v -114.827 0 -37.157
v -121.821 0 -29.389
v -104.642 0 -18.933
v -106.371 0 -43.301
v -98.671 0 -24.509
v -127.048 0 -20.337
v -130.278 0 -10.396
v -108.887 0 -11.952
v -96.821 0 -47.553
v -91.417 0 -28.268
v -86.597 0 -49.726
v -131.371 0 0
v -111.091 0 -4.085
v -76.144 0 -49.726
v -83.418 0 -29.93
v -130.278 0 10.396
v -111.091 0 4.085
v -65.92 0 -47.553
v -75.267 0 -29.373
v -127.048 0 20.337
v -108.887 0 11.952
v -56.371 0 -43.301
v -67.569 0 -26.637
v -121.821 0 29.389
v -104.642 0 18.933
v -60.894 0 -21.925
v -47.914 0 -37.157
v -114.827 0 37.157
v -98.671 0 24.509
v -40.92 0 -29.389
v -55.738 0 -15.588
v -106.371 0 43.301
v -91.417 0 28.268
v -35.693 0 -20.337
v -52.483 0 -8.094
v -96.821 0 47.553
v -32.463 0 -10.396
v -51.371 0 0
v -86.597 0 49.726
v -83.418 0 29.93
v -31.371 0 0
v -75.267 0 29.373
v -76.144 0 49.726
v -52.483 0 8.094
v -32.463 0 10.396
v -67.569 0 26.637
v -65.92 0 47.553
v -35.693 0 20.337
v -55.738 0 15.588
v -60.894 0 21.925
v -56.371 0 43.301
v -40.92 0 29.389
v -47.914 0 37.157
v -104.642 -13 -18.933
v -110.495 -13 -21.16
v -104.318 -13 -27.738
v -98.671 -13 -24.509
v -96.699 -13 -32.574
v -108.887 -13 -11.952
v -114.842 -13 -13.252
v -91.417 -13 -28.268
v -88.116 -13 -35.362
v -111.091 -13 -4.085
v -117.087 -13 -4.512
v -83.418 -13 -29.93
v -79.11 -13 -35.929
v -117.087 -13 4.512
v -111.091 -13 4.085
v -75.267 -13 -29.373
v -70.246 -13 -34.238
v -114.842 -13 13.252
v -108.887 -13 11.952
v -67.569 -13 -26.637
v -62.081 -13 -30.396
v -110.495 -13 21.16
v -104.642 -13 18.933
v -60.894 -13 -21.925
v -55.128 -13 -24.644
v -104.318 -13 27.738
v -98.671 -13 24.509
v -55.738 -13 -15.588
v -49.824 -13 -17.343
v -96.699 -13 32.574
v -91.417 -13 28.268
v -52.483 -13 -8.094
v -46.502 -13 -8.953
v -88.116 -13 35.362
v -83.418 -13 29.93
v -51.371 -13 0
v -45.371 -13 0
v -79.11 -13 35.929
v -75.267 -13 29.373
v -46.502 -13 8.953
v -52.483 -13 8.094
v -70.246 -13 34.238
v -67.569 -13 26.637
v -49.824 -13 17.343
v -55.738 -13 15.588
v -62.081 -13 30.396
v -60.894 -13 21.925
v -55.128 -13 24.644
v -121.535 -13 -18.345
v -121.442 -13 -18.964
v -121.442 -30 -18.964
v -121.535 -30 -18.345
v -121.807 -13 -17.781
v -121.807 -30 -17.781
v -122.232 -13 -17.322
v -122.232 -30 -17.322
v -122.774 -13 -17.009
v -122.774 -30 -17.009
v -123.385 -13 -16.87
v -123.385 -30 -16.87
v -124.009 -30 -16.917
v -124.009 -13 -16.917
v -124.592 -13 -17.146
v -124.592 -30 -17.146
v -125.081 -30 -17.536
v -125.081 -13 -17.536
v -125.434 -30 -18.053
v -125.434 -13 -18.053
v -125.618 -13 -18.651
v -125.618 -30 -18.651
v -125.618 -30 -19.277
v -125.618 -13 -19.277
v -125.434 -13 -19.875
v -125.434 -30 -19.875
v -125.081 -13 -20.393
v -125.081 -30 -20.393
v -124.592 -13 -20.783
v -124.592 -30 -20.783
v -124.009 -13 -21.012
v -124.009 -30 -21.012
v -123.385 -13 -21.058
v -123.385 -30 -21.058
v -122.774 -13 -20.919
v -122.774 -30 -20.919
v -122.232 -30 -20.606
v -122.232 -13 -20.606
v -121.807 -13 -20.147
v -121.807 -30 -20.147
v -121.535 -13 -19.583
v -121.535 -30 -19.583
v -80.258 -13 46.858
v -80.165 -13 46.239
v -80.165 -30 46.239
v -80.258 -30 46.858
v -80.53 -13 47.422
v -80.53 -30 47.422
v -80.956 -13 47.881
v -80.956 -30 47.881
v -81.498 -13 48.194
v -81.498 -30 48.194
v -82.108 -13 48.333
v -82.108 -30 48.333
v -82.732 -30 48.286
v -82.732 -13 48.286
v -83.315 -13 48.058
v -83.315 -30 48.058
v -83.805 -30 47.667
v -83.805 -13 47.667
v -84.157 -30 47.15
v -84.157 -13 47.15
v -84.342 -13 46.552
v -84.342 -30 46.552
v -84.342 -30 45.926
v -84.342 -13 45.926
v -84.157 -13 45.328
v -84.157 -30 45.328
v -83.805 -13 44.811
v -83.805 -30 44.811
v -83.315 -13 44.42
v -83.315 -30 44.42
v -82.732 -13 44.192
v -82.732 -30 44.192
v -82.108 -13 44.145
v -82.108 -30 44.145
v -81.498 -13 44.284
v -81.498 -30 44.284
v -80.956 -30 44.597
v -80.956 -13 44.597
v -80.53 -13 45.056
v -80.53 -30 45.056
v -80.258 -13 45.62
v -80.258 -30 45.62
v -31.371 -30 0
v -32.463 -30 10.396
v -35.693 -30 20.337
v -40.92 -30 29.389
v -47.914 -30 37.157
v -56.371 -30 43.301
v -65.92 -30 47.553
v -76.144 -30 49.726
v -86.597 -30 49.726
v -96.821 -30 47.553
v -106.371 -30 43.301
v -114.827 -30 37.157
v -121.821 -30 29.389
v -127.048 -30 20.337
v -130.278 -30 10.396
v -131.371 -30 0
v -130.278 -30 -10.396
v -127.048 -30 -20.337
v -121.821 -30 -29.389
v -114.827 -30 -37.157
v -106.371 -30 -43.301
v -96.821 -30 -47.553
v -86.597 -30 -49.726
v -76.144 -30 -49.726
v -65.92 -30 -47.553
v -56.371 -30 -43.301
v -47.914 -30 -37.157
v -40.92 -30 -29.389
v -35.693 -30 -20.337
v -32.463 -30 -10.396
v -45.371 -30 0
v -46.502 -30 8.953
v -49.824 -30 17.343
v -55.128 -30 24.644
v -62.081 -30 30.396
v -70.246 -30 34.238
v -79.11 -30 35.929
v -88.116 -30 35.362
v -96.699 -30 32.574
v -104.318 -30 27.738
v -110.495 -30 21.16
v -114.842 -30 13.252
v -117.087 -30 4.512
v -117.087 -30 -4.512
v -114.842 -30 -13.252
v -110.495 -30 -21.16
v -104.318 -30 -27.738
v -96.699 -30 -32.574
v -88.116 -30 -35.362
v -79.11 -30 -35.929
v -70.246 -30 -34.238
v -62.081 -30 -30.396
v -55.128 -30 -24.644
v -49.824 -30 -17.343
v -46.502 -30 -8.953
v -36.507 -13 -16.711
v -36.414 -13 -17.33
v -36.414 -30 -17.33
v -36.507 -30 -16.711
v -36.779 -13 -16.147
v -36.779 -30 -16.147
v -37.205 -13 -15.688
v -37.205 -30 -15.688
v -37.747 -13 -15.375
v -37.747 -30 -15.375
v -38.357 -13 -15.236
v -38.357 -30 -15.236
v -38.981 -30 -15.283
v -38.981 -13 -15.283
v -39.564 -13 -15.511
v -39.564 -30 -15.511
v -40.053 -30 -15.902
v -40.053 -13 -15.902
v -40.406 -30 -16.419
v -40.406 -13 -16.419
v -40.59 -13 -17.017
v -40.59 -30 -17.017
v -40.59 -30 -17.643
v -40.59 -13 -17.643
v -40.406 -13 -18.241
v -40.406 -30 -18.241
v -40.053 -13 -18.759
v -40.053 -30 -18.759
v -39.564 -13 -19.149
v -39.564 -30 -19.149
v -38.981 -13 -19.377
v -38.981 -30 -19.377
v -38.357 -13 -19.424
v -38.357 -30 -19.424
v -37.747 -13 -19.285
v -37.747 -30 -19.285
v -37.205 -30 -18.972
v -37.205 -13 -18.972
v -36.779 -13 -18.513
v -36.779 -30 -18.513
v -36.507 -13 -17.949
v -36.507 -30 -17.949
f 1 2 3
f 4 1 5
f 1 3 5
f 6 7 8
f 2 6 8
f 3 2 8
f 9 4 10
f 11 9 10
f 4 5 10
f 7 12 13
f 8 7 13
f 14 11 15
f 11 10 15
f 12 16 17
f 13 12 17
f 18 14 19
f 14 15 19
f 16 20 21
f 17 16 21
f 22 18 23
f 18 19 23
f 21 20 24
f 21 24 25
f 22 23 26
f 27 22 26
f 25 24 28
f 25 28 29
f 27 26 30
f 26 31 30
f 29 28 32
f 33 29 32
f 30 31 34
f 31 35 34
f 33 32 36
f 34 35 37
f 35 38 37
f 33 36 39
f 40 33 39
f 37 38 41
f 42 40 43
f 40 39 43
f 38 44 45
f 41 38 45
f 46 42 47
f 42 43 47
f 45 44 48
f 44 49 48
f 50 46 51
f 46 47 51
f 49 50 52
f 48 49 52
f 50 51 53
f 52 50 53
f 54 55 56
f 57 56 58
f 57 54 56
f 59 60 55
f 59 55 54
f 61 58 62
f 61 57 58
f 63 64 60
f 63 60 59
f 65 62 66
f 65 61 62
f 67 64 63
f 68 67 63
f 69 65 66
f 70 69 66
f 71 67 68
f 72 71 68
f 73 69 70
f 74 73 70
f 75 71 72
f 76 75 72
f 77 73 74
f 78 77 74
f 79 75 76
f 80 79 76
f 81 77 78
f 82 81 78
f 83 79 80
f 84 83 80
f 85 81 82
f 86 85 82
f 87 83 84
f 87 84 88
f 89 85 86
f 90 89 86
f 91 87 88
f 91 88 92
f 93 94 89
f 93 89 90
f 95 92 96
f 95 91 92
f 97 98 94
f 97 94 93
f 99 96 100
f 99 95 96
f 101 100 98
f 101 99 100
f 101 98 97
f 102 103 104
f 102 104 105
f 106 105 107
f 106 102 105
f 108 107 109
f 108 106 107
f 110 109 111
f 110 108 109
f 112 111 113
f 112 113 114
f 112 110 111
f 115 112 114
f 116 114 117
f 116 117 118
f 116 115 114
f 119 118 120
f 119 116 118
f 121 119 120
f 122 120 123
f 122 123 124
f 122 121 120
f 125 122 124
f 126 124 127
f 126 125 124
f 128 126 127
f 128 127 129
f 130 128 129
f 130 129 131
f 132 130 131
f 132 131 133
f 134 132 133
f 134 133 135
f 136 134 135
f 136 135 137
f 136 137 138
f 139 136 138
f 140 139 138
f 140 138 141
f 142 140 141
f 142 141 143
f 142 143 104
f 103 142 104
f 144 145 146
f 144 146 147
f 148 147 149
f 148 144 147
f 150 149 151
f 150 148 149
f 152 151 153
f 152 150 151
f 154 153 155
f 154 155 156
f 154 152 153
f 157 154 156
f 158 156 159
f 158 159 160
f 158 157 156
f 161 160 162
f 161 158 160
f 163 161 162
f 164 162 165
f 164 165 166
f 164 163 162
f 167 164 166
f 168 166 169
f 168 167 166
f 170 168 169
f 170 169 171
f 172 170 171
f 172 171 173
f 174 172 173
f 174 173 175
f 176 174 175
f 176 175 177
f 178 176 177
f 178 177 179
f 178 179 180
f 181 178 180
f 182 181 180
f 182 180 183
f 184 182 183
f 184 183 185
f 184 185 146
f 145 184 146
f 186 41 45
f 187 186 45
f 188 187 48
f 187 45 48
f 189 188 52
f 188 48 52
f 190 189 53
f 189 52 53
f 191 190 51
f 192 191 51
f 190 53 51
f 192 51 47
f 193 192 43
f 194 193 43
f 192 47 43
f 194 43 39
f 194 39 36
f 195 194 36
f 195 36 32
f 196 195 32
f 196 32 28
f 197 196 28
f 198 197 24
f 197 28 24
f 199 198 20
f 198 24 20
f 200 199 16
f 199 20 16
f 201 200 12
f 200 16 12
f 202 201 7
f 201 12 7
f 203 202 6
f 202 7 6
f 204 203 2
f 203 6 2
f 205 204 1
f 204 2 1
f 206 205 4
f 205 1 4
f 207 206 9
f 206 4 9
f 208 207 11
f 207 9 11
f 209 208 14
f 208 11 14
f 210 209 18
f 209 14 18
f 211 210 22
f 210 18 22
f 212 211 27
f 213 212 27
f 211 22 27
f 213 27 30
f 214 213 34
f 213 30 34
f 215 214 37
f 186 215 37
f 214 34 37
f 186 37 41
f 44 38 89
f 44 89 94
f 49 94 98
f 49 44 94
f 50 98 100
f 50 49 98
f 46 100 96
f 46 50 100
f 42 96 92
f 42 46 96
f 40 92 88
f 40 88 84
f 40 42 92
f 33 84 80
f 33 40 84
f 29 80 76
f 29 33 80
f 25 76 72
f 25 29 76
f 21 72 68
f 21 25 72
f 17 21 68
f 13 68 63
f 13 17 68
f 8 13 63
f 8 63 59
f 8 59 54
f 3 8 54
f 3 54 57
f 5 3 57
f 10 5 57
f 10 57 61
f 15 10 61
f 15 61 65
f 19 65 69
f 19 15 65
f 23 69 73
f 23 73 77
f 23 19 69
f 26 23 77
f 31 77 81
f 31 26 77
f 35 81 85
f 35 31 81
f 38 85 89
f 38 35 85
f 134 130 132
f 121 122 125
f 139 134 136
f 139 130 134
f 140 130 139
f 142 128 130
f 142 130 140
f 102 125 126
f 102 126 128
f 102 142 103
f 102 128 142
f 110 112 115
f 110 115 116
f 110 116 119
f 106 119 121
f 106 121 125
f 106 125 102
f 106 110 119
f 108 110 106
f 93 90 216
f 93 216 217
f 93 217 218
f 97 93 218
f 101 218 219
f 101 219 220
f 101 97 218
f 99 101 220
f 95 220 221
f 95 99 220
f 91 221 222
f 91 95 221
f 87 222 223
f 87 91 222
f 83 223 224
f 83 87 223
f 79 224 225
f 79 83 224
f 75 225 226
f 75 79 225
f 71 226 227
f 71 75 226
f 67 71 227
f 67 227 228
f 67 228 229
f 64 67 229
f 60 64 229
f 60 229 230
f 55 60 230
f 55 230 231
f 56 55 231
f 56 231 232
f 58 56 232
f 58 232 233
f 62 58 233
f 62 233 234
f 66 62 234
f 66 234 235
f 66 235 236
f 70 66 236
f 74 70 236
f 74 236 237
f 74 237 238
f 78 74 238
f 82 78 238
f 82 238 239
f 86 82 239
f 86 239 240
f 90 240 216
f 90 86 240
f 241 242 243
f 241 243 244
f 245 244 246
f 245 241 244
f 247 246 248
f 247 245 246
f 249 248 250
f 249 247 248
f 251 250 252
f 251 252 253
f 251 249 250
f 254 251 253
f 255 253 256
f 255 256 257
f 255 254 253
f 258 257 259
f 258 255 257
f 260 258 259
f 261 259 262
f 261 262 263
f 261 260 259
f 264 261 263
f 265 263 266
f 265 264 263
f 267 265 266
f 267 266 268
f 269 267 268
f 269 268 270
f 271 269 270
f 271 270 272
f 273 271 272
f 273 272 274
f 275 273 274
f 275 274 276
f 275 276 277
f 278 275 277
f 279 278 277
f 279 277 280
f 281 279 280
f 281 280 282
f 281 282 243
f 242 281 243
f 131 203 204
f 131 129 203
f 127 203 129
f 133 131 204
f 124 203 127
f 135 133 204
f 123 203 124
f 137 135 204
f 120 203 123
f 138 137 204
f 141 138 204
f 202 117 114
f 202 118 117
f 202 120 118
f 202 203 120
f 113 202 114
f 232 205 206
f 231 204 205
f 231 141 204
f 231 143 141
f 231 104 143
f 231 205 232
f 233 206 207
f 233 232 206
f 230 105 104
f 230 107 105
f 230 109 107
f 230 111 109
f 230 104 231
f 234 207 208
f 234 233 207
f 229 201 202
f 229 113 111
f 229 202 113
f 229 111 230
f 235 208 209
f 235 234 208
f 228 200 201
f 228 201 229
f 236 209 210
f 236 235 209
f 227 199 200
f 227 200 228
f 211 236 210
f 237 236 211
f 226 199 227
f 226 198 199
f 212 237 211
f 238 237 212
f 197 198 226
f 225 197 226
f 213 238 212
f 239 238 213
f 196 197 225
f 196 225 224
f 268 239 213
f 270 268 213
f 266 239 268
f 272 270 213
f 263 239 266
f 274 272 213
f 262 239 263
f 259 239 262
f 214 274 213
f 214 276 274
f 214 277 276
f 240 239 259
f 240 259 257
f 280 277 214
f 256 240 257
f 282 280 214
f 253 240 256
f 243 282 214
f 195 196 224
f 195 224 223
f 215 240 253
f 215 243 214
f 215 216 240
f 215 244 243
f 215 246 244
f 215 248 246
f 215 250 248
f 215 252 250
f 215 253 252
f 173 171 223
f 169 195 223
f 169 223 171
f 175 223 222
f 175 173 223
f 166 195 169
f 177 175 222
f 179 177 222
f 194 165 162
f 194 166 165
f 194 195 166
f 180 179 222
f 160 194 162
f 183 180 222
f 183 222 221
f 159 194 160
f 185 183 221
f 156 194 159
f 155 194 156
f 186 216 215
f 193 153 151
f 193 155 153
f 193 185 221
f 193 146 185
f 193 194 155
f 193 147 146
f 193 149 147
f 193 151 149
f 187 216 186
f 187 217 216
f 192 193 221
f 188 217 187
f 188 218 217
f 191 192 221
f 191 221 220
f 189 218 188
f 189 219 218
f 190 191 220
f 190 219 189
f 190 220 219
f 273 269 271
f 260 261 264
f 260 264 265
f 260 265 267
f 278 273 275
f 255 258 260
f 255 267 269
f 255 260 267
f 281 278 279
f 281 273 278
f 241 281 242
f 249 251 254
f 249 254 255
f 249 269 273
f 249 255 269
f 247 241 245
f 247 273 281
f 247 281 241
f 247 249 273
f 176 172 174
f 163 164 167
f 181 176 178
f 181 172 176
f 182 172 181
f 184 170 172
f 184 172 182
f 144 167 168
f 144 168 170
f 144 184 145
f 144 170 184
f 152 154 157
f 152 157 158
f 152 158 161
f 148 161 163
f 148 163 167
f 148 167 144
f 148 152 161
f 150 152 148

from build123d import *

# Parameters (mm, degrees)
F0_R     = 36
F0_R_2   = 30
F1_DEPTH = 13
F0_R_3   = 50
F0_R_4   = 2.1
F2_DEPTH = 30
F3_DEPTH = 13


with BuildPart() as f1:
    # F0 (on Front) → F1 (new body)
    with BuildSketch(Plane.XZ):
        with Locations((-81.370543, 0)):
            Circle(F0_R)
        with Locations((-81.370543, 0)):
            Circle(F0_R_2, mode=Mode.SUBTRACT)
    extrude(amount=F1_DEPTH)

    # F0 (on Front) → F2 (join)
    with BuildSketch(Plane.XZ):
        with Locations((-81.370543, 0)):
            Circle(F0_R_3)
        with Locations((-123.541678, -18.964189)):
            Circle(F0_R_4, mode=Mode.SUBTRACT)
        with Locations((-38.513874, -17.330143)):
            Circle(F0_R_4, mode=Mode.SUBTRACT)
        with Locations((-82.265135, 46.239)):
            Circle(F0_R_4, mode=Mode.SUBTRACT)
        with Locations((-81.370543, 0)):
            Circle(F0_R, mode=Mode.SUBTRACT)
    extrude(amount=F2_DEPTH)

    # F0 (on Front) → F3 (join)
    with BuildSketch(Plane.XZ):
        with Locations((-123.541678, -18.964189)):
            Circle(F0_R_4)
        with Locations((-82.265135, 46.239)):
            Circle(F0_R_4)
        with Locations((-38.513874, -17.330143)):
            Circle(F0_R_4)
    extrude(amount=F3_DEPTH)


solid = f1.part
